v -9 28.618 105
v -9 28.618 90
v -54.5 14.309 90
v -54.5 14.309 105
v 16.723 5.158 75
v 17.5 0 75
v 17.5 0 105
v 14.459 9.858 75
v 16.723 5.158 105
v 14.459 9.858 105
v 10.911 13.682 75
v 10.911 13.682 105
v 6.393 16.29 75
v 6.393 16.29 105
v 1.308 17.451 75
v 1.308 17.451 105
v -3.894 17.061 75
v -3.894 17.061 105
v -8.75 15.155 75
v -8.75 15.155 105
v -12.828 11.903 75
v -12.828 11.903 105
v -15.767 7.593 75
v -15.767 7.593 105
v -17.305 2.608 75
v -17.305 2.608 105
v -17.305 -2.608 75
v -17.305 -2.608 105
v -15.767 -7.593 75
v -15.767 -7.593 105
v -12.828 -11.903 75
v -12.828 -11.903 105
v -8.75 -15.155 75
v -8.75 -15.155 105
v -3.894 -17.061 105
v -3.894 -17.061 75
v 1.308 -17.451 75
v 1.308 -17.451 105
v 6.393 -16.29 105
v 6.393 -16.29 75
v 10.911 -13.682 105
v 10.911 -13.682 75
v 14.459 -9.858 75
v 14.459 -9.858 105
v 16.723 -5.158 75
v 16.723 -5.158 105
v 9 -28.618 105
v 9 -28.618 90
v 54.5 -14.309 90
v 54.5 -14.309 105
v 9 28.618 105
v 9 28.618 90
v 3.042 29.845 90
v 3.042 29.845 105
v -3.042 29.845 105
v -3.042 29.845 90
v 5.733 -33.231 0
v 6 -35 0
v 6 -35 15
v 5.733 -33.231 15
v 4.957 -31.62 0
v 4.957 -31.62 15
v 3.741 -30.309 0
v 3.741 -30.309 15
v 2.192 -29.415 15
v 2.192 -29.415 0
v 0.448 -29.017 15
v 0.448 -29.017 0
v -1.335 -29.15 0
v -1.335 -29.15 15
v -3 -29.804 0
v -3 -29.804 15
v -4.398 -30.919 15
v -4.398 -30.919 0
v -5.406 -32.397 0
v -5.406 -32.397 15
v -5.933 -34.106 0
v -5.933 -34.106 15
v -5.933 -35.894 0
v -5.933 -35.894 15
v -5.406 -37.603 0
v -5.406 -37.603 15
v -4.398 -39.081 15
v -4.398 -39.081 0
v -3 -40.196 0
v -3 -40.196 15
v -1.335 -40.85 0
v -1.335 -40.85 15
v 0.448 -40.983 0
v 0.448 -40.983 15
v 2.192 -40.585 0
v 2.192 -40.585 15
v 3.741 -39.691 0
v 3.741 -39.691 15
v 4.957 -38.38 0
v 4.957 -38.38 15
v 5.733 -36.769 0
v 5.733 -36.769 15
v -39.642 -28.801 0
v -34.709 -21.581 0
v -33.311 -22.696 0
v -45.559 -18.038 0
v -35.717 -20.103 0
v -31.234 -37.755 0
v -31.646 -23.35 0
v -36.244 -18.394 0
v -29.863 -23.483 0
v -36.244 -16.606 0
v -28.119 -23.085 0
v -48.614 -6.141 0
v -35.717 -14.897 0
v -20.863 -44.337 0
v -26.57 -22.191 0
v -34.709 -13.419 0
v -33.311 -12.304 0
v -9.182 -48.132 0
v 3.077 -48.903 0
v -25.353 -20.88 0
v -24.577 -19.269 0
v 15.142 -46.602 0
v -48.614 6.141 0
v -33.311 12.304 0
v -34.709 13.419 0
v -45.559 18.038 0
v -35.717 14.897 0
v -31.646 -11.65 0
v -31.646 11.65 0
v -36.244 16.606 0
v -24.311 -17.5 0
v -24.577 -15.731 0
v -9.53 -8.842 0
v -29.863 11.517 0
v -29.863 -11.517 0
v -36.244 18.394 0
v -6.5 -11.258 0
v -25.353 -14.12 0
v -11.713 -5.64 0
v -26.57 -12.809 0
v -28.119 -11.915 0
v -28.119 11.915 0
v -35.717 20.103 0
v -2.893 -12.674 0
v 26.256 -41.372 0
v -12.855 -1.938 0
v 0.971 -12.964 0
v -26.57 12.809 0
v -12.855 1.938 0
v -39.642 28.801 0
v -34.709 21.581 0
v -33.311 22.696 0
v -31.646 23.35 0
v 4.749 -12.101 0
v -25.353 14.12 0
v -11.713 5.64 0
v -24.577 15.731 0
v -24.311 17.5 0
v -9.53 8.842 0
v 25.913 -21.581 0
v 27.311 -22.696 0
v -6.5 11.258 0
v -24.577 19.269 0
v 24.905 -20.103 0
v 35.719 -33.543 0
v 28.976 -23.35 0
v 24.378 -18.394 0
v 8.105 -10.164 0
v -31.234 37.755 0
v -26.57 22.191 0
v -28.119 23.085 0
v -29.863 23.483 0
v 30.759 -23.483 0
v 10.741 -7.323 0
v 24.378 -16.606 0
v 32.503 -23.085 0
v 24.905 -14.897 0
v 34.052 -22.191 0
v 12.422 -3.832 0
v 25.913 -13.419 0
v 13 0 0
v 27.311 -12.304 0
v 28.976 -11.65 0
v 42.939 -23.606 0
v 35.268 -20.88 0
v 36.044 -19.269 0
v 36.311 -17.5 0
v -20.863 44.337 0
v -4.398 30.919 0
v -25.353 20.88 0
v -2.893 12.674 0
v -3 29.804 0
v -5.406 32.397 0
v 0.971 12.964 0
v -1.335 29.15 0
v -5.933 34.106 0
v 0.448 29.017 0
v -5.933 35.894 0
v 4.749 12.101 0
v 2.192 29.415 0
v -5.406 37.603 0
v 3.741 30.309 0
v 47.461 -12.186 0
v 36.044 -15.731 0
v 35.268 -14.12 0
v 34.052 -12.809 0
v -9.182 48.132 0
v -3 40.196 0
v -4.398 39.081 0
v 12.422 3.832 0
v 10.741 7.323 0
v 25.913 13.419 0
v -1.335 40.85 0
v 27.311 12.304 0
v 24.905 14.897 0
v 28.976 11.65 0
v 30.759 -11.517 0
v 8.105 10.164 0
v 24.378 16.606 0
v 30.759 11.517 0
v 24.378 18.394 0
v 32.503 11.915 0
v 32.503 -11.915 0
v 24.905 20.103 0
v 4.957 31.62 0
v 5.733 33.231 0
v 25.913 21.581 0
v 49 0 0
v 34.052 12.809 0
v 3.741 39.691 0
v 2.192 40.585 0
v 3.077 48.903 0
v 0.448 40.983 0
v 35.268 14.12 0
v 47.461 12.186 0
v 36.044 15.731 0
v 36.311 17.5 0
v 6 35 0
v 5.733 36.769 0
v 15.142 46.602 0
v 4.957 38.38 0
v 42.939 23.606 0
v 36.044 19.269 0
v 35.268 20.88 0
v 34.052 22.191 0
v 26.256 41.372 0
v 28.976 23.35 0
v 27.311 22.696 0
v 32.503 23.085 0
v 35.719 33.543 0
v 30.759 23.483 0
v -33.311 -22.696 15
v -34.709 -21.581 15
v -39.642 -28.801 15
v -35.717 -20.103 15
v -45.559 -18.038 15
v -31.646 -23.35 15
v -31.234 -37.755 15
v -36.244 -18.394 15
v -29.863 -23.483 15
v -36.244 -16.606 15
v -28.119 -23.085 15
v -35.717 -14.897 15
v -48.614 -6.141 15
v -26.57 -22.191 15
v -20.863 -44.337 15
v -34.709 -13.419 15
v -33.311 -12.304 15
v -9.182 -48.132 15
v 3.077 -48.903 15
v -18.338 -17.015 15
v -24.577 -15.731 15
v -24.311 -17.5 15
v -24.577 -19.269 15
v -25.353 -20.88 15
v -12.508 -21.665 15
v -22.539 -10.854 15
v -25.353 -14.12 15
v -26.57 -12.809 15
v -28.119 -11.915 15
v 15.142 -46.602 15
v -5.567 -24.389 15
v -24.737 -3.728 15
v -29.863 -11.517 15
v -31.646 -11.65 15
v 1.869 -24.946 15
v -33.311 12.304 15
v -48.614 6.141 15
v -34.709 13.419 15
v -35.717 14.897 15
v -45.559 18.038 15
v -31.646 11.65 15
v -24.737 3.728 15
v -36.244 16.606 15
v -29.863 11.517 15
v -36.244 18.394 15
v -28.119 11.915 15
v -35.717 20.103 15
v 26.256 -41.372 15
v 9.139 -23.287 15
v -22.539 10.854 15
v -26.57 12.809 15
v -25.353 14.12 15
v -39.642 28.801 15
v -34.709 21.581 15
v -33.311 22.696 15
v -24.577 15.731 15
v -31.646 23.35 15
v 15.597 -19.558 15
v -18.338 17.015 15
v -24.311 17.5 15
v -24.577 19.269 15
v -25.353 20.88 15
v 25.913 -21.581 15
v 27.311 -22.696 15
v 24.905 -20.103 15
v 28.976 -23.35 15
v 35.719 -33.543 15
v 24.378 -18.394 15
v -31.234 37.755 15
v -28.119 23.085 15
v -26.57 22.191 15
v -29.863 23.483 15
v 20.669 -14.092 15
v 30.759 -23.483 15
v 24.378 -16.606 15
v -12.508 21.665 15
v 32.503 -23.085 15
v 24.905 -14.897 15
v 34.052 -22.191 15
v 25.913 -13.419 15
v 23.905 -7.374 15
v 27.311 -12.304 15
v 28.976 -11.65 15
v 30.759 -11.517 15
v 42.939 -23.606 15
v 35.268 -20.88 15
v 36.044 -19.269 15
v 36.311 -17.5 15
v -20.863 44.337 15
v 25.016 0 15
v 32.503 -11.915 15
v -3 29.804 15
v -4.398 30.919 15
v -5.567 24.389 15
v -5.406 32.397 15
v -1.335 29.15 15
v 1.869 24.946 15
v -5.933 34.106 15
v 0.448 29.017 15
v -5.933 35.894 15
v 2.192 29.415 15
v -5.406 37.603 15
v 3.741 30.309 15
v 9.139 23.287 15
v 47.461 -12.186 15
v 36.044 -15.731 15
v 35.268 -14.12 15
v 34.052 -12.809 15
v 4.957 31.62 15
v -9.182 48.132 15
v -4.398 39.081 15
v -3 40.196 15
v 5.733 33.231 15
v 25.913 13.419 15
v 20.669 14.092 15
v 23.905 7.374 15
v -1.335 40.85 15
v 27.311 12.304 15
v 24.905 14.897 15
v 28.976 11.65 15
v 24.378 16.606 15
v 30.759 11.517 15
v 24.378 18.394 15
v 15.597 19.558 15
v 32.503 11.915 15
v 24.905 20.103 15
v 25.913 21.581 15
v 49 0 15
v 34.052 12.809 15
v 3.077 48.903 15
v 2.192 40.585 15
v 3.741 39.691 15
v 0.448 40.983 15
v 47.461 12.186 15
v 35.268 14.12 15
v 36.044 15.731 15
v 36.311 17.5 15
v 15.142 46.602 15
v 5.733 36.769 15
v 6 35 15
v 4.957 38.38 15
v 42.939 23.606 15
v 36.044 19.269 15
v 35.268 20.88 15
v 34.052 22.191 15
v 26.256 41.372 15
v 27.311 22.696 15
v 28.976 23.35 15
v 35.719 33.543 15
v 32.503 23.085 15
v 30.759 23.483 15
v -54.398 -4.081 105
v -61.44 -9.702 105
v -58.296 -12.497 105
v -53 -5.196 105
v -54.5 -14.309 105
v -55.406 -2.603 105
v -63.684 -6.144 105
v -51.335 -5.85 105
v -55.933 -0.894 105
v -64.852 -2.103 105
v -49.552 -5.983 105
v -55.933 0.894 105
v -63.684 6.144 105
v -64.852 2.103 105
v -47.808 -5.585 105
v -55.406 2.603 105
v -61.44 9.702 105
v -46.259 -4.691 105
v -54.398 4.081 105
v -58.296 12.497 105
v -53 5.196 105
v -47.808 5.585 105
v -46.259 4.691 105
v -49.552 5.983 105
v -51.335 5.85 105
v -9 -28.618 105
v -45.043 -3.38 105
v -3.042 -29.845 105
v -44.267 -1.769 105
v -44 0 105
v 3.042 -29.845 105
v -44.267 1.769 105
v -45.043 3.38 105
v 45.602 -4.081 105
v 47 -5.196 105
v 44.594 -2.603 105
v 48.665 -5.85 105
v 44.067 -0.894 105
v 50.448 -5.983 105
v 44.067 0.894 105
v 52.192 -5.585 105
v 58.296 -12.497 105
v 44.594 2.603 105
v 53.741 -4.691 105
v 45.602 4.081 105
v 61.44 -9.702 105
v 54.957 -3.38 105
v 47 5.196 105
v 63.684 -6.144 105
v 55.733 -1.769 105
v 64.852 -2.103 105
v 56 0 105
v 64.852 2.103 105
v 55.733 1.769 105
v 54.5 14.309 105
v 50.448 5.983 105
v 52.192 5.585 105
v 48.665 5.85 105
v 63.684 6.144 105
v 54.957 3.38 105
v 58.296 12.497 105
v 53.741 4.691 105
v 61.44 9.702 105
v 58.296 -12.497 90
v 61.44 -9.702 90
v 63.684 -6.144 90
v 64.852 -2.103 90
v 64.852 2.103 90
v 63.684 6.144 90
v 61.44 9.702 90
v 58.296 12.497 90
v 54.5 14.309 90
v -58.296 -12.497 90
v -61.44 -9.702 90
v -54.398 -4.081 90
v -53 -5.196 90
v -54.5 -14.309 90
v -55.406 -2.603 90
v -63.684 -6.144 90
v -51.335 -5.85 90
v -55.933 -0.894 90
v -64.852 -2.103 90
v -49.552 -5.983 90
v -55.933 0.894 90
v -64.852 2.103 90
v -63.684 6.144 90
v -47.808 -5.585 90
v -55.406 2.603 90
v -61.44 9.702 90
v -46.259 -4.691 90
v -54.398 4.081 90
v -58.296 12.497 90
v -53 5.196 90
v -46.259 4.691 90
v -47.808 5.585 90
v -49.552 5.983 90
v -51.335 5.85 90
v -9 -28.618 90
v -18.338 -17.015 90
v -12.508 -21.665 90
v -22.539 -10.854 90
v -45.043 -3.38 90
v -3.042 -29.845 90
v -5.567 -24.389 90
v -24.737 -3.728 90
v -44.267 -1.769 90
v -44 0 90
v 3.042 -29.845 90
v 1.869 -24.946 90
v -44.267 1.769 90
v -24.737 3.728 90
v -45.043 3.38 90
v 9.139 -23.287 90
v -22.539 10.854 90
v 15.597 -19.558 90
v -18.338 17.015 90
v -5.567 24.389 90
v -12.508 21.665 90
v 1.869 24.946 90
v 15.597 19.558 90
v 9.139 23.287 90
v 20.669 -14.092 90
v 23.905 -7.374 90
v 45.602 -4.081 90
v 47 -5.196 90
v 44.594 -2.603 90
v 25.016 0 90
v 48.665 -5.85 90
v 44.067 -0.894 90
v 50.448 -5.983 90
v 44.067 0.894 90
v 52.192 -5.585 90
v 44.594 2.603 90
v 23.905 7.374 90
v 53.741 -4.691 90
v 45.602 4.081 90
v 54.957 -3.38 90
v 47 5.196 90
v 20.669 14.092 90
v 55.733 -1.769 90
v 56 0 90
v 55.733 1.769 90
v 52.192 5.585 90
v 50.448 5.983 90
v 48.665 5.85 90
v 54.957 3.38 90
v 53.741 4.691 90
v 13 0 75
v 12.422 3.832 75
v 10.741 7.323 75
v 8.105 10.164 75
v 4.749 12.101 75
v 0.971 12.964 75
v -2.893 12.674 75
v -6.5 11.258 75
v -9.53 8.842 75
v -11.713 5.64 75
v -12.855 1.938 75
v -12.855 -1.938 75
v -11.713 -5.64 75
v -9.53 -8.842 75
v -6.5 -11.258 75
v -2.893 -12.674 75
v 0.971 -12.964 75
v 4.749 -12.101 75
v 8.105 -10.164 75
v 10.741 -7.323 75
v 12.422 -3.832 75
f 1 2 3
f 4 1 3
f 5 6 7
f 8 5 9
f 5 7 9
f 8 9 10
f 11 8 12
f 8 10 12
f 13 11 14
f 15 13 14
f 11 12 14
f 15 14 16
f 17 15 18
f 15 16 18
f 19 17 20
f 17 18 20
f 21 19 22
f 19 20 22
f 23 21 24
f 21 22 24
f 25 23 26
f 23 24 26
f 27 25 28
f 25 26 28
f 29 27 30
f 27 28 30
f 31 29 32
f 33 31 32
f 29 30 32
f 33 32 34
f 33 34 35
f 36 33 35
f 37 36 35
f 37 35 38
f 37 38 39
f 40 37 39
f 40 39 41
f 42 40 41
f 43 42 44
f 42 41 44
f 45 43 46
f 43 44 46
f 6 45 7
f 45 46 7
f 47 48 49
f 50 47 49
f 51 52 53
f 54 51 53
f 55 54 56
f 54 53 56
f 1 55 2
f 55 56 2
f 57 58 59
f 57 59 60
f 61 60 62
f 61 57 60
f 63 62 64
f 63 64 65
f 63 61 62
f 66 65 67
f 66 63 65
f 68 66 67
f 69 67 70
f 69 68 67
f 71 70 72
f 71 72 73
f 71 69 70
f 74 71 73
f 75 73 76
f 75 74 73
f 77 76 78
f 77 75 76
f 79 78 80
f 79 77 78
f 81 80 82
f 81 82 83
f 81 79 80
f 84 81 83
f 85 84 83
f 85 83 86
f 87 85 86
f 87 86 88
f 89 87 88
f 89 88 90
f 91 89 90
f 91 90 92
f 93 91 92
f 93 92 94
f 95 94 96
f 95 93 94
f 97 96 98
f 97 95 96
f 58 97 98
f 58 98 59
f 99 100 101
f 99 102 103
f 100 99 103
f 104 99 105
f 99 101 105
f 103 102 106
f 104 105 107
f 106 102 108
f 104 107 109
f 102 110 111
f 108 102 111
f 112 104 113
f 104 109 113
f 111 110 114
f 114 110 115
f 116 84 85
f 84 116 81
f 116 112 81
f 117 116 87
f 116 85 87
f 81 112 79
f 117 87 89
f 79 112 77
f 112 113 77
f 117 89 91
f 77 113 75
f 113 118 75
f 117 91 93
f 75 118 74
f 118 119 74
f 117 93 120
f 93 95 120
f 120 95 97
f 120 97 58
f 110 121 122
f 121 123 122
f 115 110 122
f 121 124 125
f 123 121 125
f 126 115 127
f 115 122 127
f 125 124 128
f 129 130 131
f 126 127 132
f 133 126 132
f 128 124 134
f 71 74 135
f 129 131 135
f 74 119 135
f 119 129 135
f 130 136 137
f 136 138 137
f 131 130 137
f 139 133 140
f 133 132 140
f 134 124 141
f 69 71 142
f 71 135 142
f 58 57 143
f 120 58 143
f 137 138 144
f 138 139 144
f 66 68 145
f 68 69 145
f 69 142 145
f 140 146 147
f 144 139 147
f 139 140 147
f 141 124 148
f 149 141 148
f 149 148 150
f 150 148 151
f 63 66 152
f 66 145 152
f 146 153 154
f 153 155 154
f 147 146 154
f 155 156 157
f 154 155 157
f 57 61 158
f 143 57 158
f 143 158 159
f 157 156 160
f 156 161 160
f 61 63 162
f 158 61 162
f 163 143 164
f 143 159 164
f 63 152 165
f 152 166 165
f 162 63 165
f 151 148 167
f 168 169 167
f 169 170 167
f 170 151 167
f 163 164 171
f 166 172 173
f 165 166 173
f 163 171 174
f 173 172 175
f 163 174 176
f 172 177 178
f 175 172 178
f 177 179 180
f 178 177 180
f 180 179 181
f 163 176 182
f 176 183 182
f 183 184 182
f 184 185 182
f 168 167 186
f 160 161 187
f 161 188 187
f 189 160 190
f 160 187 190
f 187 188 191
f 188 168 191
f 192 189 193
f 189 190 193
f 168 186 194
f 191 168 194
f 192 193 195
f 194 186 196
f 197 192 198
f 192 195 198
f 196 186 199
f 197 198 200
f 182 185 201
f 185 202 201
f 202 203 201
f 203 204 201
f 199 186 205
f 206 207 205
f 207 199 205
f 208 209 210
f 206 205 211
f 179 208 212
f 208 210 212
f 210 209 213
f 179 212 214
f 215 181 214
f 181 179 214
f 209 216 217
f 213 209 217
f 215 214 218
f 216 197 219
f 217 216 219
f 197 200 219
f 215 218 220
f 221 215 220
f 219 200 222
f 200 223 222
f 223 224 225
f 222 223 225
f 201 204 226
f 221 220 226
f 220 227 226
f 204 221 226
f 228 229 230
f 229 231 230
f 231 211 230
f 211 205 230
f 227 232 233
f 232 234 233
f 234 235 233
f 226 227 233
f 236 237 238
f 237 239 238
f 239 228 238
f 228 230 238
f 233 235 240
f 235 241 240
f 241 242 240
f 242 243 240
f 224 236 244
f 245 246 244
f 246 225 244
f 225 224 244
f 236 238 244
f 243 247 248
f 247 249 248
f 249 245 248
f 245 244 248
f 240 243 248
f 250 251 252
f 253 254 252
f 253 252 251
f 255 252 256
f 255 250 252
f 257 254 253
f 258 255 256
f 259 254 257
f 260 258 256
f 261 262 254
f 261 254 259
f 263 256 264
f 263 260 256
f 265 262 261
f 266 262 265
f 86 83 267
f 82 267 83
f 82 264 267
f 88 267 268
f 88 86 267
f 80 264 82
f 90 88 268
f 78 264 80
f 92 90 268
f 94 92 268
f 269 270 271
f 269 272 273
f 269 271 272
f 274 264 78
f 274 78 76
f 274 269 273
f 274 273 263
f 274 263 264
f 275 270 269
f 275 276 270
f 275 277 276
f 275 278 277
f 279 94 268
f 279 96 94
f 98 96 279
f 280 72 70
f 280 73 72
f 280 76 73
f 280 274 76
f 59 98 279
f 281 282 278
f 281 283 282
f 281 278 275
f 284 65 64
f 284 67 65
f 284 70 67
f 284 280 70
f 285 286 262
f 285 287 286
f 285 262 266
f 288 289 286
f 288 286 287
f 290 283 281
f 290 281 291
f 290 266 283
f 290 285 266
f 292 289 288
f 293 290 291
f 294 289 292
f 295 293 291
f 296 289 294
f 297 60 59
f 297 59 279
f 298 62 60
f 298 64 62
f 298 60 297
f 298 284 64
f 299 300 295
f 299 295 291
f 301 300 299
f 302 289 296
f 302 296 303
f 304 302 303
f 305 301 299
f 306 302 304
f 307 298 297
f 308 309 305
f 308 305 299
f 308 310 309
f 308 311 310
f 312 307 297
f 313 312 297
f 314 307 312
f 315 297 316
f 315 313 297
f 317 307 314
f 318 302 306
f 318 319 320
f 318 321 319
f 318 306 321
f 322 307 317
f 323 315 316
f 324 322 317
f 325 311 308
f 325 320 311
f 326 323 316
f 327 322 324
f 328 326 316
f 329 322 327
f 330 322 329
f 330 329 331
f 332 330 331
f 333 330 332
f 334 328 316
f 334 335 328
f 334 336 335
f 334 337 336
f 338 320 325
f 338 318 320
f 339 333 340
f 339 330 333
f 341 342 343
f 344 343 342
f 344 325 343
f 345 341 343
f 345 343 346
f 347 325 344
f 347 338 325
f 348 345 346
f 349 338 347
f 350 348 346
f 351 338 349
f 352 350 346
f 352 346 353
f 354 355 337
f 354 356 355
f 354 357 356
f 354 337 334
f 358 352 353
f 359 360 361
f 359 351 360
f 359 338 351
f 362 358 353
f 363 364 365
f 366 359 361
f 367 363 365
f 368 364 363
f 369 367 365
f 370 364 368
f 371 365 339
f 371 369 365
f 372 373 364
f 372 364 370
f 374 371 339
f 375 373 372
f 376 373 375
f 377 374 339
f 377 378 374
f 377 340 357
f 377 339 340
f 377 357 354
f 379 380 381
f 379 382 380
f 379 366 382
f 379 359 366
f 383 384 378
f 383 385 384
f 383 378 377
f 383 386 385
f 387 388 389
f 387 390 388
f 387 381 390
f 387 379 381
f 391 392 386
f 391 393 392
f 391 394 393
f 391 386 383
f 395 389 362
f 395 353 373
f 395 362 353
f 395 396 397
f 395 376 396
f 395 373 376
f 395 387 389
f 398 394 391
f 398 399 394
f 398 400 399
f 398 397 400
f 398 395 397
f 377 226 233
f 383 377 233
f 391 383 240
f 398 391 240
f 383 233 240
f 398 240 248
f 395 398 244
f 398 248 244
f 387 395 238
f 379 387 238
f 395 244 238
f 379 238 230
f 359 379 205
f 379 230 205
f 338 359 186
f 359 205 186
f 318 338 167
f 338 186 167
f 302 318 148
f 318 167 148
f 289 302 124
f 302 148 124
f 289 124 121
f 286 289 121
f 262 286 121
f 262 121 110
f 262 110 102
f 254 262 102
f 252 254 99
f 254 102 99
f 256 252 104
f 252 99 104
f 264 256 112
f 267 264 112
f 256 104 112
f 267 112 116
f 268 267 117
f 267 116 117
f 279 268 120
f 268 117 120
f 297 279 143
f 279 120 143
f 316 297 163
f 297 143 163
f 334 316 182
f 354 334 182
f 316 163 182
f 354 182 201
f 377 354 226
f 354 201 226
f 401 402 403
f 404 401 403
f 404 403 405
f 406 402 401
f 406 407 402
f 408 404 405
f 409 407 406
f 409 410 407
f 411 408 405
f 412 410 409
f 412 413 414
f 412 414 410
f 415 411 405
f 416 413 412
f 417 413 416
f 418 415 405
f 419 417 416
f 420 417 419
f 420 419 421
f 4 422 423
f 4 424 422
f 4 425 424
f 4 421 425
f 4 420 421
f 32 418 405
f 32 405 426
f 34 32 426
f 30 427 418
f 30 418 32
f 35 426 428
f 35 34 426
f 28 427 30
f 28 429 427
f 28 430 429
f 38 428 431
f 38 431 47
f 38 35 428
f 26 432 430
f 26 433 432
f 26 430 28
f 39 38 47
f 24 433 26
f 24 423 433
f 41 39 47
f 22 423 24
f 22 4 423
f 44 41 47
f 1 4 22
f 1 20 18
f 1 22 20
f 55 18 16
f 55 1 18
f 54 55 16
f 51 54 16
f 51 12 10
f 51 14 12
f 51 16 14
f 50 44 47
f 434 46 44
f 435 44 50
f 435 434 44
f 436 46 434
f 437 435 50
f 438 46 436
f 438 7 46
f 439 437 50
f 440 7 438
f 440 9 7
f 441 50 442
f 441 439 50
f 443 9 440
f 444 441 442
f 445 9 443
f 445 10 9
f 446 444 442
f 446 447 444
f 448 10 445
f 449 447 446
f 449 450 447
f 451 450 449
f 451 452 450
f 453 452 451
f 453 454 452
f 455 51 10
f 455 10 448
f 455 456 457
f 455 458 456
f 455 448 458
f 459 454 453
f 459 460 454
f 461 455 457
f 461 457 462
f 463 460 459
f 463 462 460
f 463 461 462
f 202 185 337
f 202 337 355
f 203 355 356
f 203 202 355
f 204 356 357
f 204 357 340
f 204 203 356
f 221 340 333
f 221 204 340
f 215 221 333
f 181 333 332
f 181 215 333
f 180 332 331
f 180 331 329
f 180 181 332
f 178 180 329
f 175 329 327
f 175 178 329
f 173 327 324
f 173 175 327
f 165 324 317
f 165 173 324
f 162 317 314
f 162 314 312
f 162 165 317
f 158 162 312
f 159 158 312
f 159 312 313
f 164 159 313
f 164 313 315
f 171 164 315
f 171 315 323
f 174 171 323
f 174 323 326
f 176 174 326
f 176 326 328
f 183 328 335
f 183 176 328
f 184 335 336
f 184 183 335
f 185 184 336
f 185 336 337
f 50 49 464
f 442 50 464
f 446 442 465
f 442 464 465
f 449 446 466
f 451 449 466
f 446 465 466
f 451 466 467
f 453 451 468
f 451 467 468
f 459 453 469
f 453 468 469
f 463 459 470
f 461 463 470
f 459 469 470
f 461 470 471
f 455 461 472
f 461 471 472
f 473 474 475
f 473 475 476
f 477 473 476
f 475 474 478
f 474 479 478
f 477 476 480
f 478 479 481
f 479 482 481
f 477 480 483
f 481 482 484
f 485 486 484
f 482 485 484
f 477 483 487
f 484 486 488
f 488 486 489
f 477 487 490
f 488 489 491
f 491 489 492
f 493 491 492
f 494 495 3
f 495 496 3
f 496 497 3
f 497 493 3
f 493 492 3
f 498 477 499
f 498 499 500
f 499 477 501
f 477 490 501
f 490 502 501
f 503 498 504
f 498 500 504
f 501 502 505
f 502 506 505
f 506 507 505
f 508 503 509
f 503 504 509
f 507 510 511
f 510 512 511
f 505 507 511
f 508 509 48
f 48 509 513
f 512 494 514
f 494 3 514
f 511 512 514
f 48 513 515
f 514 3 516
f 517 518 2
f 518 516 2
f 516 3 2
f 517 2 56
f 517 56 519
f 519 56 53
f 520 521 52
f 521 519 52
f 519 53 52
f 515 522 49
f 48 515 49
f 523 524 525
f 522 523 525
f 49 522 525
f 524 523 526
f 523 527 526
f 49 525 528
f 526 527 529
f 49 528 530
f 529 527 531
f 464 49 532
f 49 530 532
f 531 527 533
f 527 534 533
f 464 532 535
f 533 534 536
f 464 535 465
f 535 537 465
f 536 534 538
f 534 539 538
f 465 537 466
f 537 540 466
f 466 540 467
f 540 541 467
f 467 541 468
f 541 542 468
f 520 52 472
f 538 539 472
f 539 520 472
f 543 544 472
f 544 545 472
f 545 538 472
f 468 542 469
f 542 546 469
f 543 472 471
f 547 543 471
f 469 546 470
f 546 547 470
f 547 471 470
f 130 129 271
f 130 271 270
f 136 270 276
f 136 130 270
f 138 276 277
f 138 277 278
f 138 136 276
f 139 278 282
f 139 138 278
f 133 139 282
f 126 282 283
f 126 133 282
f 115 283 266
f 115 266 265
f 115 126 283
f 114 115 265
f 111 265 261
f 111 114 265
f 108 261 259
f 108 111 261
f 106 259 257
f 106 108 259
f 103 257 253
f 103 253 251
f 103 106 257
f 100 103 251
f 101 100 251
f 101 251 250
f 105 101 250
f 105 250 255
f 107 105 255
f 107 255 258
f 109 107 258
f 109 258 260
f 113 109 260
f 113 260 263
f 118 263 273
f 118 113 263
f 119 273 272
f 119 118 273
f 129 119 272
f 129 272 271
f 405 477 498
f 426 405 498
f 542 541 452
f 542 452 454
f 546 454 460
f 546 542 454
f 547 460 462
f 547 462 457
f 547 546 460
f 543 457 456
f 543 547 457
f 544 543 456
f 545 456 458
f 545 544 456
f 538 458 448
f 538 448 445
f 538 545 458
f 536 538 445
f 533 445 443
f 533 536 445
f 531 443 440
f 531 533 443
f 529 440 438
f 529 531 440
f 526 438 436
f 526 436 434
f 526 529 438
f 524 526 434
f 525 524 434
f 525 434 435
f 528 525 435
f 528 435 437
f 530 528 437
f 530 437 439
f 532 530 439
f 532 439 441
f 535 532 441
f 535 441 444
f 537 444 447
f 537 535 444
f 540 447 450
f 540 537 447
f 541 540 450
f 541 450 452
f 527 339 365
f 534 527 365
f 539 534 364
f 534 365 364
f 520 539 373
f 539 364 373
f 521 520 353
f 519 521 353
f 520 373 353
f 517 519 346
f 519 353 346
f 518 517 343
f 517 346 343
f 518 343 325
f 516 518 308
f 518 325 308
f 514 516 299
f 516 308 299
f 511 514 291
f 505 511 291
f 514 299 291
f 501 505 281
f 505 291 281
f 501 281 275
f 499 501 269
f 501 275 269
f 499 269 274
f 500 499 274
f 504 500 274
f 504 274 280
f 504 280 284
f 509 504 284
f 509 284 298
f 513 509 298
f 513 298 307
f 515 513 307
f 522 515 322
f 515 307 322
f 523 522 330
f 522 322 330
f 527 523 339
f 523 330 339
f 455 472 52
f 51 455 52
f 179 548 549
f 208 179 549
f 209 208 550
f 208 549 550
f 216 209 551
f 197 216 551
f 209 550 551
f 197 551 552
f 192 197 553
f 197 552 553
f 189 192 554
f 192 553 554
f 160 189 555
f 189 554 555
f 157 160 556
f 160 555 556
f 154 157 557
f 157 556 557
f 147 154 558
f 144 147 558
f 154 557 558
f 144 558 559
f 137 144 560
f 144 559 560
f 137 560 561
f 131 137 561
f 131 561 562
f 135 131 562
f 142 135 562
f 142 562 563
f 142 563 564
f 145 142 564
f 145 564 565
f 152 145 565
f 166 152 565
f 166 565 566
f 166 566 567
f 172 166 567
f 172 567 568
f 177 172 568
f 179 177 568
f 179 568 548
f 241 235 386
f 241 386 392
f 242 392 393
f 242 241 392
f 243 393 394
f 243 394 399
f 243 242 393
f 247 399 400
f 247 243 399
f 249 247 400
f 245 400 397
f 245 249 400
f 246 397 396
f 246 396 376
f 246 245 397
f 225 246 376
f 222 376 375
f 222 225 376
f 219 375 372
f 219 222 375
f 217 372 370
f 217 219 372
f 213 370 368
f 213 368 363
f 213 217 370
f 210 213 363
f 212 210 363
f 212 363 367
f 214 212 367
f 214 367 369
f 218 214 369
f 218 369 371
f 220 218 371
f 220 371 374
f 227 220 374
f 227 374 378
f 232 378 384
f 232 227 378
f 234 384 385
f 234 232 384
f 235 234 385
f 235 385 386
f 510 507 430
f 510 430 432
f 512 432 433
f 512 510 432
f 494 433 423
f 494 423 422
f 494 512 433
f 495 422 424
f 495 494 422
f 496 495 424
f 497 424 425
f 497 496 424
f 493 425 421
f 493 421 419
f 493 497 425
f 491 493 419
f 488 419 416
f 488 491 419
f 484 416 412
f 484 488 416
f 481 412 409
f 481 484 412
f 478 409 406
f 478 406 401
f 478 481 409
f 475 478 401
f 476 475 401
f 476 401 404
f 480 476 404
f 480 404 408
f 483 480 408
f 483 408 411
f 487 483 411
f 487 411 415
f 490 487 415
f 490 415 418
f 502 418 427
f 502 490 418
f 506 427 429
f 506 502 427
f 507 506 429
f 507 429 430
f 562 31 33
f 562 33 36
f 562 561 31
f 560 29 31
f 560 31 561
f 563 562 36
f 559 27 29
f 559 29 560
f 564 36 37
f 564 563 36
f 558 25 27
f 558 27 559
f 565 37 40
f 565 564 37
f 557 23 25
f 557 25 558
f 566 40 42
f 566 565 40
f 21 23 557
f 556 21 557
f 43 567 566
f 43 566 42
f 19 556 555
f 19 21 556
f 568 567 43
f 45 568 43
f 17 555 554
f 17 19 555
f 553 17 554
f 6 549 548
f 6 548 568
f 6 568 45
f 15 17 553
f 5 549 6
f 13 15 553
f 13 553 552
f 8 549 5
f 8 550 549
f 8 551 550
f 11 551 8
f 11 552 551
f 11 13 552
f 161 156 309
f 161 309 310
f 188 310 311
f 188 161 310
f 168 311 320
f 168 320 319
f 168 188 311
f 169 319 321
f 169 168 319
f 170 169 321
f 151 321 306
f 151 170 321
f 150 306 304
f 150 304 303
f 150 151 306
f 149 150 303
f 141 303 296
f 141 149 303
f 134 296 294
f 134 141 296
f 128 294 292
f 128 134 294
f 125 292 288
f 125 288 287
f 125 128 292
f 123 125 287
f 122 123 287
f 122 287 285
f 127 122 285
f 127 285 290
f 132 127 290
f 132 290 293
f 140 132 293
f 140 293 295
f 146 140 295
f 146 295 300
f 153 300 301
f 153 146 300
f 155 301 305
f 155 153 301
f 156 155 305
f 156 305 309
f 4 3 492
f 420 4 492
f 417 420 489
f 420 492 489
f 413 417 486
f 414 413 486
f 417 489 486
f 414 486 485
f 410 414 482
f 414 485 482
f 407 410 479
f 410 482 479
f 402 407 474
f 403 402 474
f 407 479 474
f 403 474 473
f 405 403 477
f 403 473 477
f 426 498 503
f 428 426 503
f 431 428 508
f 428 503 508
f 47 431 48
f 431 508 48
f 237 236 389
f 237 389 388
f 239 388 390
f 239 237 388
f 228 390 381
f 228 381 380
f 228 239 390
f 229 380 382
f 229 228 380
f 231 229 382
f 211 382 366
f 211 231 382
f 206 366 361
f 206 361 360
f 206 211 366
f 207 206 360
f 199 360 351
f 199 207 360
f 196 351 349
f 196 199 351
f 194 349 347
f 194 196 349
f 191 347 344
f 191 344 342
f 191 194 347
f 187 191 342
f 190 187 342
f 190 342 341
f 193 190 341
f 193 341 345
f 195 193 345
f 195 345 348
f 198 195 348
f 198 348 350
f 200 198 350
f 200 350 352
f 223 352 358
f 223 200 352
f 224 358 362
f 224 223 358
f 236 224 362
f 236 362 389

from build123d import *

# Parameters (mm, degrees)
F0_R      = 49
F0_R_2    = 6
F1_DEPTH  = 15
F2_R      = 25.016122
F3_DEPTH  = 75
F4_R      = 6
F5_DEPTH  = 15
F6_R      = 17.5
F7_DEPTH  = 30
F9_R      = 13
F10_DEPTH = 150


with BuildPart() as f1:
    # F0 (on Top) → F1 (new body)
    with BuildSketch(Plane.XY):
        Circle(F0_R)
        with Locations((0, -35)):
            Circle(F0_R_2, mode=Mode.SUBTRACT)
        with Locations((-30.310889, -17.5)):
            Circle(F0_R_2, mode=Mode.SUBTRACT)
        with Locations((30.310889, -17.5)):
            Circle(F0_R_2, mode=Mode.SUBTRACT)
        with Locations((-30.310889, 17.5)):
            Circle(F0_R_2, mode=Mode.SUBTRACT)
        with Locations((0, 35)):
            Circle(F0_R_2, mode=Mode.SUBTRACT)
        with Locations((30.310889, 17.5)):
            Circle(F0_R_2, mode=Mode.SUBTRACT)
    extrude(amount=F1_DEPTH)

    # F2 (on face) → F3 (join)
    with BuildSketch(Plane.XY.offset(15)):
        Circle(F2_R)
    extrude(amount=F3_DEPTH)

    # F4 (on face) → F5 (join)
    with BuildSketch(Plane.XY.offset(90)):
        with BuildLine():
            Line((9, -28.618176), (54.5, -14.309088))
            ThreePointArc((54.5, -14.309088), (65, 0), (54.5, 14.309088))
            Line((54.5, 14.309088), (9, 28.618176))
            ThreePointArc((9, 28.618176), (0, 30), (-9, 28.618176))
            Line((-9, 28.618176), (-54.5, 14.309088))
            ThreePointArc((-54.5, 14.309088), (-65, 0), (-54.5, -14.309088))
            Line((-54.5, -14.309088), (-9, -28.618176))
            ThreePointArc((-9, -28.618176), (0, -30), (9, -28.618176))
        make_face()
        with Locations((-50, 0)):
            Circle(F4_R, mode=Mode.SUBTRACT)
        with Locations((50, 0)):
            Circle(F4_R, mode=Mode.SUBTRACT)
    extrude(amount=F5_DEPTH)


with BuildPart() as f7:
    # F6 (on face) → F7 (new body)
    with BuildSketch(Plane.XY.offset(105)):
        Circle(F6_R)
    extrude(amount=-F7_DEPTH)


with BuildPart() as f1_1:
    add(f1.part)

    # F8: cut F7
    add(f7.part, mode=Mode.SUBTRACT)


with BuildPart() as f10:
    # F9 (on face) → F10 (new body)
    with BuildSketch(Plane.XY.offset(75)):
        Circle(F9_R)
    extrude(amount=-F10_DEPTH)


with BuildPart() as f1_2:
    add(f1_1.part)

    # F11: cut F10
    add(f10.part, mode=Mode.SUBTRACT)


solid = f1_2.part
